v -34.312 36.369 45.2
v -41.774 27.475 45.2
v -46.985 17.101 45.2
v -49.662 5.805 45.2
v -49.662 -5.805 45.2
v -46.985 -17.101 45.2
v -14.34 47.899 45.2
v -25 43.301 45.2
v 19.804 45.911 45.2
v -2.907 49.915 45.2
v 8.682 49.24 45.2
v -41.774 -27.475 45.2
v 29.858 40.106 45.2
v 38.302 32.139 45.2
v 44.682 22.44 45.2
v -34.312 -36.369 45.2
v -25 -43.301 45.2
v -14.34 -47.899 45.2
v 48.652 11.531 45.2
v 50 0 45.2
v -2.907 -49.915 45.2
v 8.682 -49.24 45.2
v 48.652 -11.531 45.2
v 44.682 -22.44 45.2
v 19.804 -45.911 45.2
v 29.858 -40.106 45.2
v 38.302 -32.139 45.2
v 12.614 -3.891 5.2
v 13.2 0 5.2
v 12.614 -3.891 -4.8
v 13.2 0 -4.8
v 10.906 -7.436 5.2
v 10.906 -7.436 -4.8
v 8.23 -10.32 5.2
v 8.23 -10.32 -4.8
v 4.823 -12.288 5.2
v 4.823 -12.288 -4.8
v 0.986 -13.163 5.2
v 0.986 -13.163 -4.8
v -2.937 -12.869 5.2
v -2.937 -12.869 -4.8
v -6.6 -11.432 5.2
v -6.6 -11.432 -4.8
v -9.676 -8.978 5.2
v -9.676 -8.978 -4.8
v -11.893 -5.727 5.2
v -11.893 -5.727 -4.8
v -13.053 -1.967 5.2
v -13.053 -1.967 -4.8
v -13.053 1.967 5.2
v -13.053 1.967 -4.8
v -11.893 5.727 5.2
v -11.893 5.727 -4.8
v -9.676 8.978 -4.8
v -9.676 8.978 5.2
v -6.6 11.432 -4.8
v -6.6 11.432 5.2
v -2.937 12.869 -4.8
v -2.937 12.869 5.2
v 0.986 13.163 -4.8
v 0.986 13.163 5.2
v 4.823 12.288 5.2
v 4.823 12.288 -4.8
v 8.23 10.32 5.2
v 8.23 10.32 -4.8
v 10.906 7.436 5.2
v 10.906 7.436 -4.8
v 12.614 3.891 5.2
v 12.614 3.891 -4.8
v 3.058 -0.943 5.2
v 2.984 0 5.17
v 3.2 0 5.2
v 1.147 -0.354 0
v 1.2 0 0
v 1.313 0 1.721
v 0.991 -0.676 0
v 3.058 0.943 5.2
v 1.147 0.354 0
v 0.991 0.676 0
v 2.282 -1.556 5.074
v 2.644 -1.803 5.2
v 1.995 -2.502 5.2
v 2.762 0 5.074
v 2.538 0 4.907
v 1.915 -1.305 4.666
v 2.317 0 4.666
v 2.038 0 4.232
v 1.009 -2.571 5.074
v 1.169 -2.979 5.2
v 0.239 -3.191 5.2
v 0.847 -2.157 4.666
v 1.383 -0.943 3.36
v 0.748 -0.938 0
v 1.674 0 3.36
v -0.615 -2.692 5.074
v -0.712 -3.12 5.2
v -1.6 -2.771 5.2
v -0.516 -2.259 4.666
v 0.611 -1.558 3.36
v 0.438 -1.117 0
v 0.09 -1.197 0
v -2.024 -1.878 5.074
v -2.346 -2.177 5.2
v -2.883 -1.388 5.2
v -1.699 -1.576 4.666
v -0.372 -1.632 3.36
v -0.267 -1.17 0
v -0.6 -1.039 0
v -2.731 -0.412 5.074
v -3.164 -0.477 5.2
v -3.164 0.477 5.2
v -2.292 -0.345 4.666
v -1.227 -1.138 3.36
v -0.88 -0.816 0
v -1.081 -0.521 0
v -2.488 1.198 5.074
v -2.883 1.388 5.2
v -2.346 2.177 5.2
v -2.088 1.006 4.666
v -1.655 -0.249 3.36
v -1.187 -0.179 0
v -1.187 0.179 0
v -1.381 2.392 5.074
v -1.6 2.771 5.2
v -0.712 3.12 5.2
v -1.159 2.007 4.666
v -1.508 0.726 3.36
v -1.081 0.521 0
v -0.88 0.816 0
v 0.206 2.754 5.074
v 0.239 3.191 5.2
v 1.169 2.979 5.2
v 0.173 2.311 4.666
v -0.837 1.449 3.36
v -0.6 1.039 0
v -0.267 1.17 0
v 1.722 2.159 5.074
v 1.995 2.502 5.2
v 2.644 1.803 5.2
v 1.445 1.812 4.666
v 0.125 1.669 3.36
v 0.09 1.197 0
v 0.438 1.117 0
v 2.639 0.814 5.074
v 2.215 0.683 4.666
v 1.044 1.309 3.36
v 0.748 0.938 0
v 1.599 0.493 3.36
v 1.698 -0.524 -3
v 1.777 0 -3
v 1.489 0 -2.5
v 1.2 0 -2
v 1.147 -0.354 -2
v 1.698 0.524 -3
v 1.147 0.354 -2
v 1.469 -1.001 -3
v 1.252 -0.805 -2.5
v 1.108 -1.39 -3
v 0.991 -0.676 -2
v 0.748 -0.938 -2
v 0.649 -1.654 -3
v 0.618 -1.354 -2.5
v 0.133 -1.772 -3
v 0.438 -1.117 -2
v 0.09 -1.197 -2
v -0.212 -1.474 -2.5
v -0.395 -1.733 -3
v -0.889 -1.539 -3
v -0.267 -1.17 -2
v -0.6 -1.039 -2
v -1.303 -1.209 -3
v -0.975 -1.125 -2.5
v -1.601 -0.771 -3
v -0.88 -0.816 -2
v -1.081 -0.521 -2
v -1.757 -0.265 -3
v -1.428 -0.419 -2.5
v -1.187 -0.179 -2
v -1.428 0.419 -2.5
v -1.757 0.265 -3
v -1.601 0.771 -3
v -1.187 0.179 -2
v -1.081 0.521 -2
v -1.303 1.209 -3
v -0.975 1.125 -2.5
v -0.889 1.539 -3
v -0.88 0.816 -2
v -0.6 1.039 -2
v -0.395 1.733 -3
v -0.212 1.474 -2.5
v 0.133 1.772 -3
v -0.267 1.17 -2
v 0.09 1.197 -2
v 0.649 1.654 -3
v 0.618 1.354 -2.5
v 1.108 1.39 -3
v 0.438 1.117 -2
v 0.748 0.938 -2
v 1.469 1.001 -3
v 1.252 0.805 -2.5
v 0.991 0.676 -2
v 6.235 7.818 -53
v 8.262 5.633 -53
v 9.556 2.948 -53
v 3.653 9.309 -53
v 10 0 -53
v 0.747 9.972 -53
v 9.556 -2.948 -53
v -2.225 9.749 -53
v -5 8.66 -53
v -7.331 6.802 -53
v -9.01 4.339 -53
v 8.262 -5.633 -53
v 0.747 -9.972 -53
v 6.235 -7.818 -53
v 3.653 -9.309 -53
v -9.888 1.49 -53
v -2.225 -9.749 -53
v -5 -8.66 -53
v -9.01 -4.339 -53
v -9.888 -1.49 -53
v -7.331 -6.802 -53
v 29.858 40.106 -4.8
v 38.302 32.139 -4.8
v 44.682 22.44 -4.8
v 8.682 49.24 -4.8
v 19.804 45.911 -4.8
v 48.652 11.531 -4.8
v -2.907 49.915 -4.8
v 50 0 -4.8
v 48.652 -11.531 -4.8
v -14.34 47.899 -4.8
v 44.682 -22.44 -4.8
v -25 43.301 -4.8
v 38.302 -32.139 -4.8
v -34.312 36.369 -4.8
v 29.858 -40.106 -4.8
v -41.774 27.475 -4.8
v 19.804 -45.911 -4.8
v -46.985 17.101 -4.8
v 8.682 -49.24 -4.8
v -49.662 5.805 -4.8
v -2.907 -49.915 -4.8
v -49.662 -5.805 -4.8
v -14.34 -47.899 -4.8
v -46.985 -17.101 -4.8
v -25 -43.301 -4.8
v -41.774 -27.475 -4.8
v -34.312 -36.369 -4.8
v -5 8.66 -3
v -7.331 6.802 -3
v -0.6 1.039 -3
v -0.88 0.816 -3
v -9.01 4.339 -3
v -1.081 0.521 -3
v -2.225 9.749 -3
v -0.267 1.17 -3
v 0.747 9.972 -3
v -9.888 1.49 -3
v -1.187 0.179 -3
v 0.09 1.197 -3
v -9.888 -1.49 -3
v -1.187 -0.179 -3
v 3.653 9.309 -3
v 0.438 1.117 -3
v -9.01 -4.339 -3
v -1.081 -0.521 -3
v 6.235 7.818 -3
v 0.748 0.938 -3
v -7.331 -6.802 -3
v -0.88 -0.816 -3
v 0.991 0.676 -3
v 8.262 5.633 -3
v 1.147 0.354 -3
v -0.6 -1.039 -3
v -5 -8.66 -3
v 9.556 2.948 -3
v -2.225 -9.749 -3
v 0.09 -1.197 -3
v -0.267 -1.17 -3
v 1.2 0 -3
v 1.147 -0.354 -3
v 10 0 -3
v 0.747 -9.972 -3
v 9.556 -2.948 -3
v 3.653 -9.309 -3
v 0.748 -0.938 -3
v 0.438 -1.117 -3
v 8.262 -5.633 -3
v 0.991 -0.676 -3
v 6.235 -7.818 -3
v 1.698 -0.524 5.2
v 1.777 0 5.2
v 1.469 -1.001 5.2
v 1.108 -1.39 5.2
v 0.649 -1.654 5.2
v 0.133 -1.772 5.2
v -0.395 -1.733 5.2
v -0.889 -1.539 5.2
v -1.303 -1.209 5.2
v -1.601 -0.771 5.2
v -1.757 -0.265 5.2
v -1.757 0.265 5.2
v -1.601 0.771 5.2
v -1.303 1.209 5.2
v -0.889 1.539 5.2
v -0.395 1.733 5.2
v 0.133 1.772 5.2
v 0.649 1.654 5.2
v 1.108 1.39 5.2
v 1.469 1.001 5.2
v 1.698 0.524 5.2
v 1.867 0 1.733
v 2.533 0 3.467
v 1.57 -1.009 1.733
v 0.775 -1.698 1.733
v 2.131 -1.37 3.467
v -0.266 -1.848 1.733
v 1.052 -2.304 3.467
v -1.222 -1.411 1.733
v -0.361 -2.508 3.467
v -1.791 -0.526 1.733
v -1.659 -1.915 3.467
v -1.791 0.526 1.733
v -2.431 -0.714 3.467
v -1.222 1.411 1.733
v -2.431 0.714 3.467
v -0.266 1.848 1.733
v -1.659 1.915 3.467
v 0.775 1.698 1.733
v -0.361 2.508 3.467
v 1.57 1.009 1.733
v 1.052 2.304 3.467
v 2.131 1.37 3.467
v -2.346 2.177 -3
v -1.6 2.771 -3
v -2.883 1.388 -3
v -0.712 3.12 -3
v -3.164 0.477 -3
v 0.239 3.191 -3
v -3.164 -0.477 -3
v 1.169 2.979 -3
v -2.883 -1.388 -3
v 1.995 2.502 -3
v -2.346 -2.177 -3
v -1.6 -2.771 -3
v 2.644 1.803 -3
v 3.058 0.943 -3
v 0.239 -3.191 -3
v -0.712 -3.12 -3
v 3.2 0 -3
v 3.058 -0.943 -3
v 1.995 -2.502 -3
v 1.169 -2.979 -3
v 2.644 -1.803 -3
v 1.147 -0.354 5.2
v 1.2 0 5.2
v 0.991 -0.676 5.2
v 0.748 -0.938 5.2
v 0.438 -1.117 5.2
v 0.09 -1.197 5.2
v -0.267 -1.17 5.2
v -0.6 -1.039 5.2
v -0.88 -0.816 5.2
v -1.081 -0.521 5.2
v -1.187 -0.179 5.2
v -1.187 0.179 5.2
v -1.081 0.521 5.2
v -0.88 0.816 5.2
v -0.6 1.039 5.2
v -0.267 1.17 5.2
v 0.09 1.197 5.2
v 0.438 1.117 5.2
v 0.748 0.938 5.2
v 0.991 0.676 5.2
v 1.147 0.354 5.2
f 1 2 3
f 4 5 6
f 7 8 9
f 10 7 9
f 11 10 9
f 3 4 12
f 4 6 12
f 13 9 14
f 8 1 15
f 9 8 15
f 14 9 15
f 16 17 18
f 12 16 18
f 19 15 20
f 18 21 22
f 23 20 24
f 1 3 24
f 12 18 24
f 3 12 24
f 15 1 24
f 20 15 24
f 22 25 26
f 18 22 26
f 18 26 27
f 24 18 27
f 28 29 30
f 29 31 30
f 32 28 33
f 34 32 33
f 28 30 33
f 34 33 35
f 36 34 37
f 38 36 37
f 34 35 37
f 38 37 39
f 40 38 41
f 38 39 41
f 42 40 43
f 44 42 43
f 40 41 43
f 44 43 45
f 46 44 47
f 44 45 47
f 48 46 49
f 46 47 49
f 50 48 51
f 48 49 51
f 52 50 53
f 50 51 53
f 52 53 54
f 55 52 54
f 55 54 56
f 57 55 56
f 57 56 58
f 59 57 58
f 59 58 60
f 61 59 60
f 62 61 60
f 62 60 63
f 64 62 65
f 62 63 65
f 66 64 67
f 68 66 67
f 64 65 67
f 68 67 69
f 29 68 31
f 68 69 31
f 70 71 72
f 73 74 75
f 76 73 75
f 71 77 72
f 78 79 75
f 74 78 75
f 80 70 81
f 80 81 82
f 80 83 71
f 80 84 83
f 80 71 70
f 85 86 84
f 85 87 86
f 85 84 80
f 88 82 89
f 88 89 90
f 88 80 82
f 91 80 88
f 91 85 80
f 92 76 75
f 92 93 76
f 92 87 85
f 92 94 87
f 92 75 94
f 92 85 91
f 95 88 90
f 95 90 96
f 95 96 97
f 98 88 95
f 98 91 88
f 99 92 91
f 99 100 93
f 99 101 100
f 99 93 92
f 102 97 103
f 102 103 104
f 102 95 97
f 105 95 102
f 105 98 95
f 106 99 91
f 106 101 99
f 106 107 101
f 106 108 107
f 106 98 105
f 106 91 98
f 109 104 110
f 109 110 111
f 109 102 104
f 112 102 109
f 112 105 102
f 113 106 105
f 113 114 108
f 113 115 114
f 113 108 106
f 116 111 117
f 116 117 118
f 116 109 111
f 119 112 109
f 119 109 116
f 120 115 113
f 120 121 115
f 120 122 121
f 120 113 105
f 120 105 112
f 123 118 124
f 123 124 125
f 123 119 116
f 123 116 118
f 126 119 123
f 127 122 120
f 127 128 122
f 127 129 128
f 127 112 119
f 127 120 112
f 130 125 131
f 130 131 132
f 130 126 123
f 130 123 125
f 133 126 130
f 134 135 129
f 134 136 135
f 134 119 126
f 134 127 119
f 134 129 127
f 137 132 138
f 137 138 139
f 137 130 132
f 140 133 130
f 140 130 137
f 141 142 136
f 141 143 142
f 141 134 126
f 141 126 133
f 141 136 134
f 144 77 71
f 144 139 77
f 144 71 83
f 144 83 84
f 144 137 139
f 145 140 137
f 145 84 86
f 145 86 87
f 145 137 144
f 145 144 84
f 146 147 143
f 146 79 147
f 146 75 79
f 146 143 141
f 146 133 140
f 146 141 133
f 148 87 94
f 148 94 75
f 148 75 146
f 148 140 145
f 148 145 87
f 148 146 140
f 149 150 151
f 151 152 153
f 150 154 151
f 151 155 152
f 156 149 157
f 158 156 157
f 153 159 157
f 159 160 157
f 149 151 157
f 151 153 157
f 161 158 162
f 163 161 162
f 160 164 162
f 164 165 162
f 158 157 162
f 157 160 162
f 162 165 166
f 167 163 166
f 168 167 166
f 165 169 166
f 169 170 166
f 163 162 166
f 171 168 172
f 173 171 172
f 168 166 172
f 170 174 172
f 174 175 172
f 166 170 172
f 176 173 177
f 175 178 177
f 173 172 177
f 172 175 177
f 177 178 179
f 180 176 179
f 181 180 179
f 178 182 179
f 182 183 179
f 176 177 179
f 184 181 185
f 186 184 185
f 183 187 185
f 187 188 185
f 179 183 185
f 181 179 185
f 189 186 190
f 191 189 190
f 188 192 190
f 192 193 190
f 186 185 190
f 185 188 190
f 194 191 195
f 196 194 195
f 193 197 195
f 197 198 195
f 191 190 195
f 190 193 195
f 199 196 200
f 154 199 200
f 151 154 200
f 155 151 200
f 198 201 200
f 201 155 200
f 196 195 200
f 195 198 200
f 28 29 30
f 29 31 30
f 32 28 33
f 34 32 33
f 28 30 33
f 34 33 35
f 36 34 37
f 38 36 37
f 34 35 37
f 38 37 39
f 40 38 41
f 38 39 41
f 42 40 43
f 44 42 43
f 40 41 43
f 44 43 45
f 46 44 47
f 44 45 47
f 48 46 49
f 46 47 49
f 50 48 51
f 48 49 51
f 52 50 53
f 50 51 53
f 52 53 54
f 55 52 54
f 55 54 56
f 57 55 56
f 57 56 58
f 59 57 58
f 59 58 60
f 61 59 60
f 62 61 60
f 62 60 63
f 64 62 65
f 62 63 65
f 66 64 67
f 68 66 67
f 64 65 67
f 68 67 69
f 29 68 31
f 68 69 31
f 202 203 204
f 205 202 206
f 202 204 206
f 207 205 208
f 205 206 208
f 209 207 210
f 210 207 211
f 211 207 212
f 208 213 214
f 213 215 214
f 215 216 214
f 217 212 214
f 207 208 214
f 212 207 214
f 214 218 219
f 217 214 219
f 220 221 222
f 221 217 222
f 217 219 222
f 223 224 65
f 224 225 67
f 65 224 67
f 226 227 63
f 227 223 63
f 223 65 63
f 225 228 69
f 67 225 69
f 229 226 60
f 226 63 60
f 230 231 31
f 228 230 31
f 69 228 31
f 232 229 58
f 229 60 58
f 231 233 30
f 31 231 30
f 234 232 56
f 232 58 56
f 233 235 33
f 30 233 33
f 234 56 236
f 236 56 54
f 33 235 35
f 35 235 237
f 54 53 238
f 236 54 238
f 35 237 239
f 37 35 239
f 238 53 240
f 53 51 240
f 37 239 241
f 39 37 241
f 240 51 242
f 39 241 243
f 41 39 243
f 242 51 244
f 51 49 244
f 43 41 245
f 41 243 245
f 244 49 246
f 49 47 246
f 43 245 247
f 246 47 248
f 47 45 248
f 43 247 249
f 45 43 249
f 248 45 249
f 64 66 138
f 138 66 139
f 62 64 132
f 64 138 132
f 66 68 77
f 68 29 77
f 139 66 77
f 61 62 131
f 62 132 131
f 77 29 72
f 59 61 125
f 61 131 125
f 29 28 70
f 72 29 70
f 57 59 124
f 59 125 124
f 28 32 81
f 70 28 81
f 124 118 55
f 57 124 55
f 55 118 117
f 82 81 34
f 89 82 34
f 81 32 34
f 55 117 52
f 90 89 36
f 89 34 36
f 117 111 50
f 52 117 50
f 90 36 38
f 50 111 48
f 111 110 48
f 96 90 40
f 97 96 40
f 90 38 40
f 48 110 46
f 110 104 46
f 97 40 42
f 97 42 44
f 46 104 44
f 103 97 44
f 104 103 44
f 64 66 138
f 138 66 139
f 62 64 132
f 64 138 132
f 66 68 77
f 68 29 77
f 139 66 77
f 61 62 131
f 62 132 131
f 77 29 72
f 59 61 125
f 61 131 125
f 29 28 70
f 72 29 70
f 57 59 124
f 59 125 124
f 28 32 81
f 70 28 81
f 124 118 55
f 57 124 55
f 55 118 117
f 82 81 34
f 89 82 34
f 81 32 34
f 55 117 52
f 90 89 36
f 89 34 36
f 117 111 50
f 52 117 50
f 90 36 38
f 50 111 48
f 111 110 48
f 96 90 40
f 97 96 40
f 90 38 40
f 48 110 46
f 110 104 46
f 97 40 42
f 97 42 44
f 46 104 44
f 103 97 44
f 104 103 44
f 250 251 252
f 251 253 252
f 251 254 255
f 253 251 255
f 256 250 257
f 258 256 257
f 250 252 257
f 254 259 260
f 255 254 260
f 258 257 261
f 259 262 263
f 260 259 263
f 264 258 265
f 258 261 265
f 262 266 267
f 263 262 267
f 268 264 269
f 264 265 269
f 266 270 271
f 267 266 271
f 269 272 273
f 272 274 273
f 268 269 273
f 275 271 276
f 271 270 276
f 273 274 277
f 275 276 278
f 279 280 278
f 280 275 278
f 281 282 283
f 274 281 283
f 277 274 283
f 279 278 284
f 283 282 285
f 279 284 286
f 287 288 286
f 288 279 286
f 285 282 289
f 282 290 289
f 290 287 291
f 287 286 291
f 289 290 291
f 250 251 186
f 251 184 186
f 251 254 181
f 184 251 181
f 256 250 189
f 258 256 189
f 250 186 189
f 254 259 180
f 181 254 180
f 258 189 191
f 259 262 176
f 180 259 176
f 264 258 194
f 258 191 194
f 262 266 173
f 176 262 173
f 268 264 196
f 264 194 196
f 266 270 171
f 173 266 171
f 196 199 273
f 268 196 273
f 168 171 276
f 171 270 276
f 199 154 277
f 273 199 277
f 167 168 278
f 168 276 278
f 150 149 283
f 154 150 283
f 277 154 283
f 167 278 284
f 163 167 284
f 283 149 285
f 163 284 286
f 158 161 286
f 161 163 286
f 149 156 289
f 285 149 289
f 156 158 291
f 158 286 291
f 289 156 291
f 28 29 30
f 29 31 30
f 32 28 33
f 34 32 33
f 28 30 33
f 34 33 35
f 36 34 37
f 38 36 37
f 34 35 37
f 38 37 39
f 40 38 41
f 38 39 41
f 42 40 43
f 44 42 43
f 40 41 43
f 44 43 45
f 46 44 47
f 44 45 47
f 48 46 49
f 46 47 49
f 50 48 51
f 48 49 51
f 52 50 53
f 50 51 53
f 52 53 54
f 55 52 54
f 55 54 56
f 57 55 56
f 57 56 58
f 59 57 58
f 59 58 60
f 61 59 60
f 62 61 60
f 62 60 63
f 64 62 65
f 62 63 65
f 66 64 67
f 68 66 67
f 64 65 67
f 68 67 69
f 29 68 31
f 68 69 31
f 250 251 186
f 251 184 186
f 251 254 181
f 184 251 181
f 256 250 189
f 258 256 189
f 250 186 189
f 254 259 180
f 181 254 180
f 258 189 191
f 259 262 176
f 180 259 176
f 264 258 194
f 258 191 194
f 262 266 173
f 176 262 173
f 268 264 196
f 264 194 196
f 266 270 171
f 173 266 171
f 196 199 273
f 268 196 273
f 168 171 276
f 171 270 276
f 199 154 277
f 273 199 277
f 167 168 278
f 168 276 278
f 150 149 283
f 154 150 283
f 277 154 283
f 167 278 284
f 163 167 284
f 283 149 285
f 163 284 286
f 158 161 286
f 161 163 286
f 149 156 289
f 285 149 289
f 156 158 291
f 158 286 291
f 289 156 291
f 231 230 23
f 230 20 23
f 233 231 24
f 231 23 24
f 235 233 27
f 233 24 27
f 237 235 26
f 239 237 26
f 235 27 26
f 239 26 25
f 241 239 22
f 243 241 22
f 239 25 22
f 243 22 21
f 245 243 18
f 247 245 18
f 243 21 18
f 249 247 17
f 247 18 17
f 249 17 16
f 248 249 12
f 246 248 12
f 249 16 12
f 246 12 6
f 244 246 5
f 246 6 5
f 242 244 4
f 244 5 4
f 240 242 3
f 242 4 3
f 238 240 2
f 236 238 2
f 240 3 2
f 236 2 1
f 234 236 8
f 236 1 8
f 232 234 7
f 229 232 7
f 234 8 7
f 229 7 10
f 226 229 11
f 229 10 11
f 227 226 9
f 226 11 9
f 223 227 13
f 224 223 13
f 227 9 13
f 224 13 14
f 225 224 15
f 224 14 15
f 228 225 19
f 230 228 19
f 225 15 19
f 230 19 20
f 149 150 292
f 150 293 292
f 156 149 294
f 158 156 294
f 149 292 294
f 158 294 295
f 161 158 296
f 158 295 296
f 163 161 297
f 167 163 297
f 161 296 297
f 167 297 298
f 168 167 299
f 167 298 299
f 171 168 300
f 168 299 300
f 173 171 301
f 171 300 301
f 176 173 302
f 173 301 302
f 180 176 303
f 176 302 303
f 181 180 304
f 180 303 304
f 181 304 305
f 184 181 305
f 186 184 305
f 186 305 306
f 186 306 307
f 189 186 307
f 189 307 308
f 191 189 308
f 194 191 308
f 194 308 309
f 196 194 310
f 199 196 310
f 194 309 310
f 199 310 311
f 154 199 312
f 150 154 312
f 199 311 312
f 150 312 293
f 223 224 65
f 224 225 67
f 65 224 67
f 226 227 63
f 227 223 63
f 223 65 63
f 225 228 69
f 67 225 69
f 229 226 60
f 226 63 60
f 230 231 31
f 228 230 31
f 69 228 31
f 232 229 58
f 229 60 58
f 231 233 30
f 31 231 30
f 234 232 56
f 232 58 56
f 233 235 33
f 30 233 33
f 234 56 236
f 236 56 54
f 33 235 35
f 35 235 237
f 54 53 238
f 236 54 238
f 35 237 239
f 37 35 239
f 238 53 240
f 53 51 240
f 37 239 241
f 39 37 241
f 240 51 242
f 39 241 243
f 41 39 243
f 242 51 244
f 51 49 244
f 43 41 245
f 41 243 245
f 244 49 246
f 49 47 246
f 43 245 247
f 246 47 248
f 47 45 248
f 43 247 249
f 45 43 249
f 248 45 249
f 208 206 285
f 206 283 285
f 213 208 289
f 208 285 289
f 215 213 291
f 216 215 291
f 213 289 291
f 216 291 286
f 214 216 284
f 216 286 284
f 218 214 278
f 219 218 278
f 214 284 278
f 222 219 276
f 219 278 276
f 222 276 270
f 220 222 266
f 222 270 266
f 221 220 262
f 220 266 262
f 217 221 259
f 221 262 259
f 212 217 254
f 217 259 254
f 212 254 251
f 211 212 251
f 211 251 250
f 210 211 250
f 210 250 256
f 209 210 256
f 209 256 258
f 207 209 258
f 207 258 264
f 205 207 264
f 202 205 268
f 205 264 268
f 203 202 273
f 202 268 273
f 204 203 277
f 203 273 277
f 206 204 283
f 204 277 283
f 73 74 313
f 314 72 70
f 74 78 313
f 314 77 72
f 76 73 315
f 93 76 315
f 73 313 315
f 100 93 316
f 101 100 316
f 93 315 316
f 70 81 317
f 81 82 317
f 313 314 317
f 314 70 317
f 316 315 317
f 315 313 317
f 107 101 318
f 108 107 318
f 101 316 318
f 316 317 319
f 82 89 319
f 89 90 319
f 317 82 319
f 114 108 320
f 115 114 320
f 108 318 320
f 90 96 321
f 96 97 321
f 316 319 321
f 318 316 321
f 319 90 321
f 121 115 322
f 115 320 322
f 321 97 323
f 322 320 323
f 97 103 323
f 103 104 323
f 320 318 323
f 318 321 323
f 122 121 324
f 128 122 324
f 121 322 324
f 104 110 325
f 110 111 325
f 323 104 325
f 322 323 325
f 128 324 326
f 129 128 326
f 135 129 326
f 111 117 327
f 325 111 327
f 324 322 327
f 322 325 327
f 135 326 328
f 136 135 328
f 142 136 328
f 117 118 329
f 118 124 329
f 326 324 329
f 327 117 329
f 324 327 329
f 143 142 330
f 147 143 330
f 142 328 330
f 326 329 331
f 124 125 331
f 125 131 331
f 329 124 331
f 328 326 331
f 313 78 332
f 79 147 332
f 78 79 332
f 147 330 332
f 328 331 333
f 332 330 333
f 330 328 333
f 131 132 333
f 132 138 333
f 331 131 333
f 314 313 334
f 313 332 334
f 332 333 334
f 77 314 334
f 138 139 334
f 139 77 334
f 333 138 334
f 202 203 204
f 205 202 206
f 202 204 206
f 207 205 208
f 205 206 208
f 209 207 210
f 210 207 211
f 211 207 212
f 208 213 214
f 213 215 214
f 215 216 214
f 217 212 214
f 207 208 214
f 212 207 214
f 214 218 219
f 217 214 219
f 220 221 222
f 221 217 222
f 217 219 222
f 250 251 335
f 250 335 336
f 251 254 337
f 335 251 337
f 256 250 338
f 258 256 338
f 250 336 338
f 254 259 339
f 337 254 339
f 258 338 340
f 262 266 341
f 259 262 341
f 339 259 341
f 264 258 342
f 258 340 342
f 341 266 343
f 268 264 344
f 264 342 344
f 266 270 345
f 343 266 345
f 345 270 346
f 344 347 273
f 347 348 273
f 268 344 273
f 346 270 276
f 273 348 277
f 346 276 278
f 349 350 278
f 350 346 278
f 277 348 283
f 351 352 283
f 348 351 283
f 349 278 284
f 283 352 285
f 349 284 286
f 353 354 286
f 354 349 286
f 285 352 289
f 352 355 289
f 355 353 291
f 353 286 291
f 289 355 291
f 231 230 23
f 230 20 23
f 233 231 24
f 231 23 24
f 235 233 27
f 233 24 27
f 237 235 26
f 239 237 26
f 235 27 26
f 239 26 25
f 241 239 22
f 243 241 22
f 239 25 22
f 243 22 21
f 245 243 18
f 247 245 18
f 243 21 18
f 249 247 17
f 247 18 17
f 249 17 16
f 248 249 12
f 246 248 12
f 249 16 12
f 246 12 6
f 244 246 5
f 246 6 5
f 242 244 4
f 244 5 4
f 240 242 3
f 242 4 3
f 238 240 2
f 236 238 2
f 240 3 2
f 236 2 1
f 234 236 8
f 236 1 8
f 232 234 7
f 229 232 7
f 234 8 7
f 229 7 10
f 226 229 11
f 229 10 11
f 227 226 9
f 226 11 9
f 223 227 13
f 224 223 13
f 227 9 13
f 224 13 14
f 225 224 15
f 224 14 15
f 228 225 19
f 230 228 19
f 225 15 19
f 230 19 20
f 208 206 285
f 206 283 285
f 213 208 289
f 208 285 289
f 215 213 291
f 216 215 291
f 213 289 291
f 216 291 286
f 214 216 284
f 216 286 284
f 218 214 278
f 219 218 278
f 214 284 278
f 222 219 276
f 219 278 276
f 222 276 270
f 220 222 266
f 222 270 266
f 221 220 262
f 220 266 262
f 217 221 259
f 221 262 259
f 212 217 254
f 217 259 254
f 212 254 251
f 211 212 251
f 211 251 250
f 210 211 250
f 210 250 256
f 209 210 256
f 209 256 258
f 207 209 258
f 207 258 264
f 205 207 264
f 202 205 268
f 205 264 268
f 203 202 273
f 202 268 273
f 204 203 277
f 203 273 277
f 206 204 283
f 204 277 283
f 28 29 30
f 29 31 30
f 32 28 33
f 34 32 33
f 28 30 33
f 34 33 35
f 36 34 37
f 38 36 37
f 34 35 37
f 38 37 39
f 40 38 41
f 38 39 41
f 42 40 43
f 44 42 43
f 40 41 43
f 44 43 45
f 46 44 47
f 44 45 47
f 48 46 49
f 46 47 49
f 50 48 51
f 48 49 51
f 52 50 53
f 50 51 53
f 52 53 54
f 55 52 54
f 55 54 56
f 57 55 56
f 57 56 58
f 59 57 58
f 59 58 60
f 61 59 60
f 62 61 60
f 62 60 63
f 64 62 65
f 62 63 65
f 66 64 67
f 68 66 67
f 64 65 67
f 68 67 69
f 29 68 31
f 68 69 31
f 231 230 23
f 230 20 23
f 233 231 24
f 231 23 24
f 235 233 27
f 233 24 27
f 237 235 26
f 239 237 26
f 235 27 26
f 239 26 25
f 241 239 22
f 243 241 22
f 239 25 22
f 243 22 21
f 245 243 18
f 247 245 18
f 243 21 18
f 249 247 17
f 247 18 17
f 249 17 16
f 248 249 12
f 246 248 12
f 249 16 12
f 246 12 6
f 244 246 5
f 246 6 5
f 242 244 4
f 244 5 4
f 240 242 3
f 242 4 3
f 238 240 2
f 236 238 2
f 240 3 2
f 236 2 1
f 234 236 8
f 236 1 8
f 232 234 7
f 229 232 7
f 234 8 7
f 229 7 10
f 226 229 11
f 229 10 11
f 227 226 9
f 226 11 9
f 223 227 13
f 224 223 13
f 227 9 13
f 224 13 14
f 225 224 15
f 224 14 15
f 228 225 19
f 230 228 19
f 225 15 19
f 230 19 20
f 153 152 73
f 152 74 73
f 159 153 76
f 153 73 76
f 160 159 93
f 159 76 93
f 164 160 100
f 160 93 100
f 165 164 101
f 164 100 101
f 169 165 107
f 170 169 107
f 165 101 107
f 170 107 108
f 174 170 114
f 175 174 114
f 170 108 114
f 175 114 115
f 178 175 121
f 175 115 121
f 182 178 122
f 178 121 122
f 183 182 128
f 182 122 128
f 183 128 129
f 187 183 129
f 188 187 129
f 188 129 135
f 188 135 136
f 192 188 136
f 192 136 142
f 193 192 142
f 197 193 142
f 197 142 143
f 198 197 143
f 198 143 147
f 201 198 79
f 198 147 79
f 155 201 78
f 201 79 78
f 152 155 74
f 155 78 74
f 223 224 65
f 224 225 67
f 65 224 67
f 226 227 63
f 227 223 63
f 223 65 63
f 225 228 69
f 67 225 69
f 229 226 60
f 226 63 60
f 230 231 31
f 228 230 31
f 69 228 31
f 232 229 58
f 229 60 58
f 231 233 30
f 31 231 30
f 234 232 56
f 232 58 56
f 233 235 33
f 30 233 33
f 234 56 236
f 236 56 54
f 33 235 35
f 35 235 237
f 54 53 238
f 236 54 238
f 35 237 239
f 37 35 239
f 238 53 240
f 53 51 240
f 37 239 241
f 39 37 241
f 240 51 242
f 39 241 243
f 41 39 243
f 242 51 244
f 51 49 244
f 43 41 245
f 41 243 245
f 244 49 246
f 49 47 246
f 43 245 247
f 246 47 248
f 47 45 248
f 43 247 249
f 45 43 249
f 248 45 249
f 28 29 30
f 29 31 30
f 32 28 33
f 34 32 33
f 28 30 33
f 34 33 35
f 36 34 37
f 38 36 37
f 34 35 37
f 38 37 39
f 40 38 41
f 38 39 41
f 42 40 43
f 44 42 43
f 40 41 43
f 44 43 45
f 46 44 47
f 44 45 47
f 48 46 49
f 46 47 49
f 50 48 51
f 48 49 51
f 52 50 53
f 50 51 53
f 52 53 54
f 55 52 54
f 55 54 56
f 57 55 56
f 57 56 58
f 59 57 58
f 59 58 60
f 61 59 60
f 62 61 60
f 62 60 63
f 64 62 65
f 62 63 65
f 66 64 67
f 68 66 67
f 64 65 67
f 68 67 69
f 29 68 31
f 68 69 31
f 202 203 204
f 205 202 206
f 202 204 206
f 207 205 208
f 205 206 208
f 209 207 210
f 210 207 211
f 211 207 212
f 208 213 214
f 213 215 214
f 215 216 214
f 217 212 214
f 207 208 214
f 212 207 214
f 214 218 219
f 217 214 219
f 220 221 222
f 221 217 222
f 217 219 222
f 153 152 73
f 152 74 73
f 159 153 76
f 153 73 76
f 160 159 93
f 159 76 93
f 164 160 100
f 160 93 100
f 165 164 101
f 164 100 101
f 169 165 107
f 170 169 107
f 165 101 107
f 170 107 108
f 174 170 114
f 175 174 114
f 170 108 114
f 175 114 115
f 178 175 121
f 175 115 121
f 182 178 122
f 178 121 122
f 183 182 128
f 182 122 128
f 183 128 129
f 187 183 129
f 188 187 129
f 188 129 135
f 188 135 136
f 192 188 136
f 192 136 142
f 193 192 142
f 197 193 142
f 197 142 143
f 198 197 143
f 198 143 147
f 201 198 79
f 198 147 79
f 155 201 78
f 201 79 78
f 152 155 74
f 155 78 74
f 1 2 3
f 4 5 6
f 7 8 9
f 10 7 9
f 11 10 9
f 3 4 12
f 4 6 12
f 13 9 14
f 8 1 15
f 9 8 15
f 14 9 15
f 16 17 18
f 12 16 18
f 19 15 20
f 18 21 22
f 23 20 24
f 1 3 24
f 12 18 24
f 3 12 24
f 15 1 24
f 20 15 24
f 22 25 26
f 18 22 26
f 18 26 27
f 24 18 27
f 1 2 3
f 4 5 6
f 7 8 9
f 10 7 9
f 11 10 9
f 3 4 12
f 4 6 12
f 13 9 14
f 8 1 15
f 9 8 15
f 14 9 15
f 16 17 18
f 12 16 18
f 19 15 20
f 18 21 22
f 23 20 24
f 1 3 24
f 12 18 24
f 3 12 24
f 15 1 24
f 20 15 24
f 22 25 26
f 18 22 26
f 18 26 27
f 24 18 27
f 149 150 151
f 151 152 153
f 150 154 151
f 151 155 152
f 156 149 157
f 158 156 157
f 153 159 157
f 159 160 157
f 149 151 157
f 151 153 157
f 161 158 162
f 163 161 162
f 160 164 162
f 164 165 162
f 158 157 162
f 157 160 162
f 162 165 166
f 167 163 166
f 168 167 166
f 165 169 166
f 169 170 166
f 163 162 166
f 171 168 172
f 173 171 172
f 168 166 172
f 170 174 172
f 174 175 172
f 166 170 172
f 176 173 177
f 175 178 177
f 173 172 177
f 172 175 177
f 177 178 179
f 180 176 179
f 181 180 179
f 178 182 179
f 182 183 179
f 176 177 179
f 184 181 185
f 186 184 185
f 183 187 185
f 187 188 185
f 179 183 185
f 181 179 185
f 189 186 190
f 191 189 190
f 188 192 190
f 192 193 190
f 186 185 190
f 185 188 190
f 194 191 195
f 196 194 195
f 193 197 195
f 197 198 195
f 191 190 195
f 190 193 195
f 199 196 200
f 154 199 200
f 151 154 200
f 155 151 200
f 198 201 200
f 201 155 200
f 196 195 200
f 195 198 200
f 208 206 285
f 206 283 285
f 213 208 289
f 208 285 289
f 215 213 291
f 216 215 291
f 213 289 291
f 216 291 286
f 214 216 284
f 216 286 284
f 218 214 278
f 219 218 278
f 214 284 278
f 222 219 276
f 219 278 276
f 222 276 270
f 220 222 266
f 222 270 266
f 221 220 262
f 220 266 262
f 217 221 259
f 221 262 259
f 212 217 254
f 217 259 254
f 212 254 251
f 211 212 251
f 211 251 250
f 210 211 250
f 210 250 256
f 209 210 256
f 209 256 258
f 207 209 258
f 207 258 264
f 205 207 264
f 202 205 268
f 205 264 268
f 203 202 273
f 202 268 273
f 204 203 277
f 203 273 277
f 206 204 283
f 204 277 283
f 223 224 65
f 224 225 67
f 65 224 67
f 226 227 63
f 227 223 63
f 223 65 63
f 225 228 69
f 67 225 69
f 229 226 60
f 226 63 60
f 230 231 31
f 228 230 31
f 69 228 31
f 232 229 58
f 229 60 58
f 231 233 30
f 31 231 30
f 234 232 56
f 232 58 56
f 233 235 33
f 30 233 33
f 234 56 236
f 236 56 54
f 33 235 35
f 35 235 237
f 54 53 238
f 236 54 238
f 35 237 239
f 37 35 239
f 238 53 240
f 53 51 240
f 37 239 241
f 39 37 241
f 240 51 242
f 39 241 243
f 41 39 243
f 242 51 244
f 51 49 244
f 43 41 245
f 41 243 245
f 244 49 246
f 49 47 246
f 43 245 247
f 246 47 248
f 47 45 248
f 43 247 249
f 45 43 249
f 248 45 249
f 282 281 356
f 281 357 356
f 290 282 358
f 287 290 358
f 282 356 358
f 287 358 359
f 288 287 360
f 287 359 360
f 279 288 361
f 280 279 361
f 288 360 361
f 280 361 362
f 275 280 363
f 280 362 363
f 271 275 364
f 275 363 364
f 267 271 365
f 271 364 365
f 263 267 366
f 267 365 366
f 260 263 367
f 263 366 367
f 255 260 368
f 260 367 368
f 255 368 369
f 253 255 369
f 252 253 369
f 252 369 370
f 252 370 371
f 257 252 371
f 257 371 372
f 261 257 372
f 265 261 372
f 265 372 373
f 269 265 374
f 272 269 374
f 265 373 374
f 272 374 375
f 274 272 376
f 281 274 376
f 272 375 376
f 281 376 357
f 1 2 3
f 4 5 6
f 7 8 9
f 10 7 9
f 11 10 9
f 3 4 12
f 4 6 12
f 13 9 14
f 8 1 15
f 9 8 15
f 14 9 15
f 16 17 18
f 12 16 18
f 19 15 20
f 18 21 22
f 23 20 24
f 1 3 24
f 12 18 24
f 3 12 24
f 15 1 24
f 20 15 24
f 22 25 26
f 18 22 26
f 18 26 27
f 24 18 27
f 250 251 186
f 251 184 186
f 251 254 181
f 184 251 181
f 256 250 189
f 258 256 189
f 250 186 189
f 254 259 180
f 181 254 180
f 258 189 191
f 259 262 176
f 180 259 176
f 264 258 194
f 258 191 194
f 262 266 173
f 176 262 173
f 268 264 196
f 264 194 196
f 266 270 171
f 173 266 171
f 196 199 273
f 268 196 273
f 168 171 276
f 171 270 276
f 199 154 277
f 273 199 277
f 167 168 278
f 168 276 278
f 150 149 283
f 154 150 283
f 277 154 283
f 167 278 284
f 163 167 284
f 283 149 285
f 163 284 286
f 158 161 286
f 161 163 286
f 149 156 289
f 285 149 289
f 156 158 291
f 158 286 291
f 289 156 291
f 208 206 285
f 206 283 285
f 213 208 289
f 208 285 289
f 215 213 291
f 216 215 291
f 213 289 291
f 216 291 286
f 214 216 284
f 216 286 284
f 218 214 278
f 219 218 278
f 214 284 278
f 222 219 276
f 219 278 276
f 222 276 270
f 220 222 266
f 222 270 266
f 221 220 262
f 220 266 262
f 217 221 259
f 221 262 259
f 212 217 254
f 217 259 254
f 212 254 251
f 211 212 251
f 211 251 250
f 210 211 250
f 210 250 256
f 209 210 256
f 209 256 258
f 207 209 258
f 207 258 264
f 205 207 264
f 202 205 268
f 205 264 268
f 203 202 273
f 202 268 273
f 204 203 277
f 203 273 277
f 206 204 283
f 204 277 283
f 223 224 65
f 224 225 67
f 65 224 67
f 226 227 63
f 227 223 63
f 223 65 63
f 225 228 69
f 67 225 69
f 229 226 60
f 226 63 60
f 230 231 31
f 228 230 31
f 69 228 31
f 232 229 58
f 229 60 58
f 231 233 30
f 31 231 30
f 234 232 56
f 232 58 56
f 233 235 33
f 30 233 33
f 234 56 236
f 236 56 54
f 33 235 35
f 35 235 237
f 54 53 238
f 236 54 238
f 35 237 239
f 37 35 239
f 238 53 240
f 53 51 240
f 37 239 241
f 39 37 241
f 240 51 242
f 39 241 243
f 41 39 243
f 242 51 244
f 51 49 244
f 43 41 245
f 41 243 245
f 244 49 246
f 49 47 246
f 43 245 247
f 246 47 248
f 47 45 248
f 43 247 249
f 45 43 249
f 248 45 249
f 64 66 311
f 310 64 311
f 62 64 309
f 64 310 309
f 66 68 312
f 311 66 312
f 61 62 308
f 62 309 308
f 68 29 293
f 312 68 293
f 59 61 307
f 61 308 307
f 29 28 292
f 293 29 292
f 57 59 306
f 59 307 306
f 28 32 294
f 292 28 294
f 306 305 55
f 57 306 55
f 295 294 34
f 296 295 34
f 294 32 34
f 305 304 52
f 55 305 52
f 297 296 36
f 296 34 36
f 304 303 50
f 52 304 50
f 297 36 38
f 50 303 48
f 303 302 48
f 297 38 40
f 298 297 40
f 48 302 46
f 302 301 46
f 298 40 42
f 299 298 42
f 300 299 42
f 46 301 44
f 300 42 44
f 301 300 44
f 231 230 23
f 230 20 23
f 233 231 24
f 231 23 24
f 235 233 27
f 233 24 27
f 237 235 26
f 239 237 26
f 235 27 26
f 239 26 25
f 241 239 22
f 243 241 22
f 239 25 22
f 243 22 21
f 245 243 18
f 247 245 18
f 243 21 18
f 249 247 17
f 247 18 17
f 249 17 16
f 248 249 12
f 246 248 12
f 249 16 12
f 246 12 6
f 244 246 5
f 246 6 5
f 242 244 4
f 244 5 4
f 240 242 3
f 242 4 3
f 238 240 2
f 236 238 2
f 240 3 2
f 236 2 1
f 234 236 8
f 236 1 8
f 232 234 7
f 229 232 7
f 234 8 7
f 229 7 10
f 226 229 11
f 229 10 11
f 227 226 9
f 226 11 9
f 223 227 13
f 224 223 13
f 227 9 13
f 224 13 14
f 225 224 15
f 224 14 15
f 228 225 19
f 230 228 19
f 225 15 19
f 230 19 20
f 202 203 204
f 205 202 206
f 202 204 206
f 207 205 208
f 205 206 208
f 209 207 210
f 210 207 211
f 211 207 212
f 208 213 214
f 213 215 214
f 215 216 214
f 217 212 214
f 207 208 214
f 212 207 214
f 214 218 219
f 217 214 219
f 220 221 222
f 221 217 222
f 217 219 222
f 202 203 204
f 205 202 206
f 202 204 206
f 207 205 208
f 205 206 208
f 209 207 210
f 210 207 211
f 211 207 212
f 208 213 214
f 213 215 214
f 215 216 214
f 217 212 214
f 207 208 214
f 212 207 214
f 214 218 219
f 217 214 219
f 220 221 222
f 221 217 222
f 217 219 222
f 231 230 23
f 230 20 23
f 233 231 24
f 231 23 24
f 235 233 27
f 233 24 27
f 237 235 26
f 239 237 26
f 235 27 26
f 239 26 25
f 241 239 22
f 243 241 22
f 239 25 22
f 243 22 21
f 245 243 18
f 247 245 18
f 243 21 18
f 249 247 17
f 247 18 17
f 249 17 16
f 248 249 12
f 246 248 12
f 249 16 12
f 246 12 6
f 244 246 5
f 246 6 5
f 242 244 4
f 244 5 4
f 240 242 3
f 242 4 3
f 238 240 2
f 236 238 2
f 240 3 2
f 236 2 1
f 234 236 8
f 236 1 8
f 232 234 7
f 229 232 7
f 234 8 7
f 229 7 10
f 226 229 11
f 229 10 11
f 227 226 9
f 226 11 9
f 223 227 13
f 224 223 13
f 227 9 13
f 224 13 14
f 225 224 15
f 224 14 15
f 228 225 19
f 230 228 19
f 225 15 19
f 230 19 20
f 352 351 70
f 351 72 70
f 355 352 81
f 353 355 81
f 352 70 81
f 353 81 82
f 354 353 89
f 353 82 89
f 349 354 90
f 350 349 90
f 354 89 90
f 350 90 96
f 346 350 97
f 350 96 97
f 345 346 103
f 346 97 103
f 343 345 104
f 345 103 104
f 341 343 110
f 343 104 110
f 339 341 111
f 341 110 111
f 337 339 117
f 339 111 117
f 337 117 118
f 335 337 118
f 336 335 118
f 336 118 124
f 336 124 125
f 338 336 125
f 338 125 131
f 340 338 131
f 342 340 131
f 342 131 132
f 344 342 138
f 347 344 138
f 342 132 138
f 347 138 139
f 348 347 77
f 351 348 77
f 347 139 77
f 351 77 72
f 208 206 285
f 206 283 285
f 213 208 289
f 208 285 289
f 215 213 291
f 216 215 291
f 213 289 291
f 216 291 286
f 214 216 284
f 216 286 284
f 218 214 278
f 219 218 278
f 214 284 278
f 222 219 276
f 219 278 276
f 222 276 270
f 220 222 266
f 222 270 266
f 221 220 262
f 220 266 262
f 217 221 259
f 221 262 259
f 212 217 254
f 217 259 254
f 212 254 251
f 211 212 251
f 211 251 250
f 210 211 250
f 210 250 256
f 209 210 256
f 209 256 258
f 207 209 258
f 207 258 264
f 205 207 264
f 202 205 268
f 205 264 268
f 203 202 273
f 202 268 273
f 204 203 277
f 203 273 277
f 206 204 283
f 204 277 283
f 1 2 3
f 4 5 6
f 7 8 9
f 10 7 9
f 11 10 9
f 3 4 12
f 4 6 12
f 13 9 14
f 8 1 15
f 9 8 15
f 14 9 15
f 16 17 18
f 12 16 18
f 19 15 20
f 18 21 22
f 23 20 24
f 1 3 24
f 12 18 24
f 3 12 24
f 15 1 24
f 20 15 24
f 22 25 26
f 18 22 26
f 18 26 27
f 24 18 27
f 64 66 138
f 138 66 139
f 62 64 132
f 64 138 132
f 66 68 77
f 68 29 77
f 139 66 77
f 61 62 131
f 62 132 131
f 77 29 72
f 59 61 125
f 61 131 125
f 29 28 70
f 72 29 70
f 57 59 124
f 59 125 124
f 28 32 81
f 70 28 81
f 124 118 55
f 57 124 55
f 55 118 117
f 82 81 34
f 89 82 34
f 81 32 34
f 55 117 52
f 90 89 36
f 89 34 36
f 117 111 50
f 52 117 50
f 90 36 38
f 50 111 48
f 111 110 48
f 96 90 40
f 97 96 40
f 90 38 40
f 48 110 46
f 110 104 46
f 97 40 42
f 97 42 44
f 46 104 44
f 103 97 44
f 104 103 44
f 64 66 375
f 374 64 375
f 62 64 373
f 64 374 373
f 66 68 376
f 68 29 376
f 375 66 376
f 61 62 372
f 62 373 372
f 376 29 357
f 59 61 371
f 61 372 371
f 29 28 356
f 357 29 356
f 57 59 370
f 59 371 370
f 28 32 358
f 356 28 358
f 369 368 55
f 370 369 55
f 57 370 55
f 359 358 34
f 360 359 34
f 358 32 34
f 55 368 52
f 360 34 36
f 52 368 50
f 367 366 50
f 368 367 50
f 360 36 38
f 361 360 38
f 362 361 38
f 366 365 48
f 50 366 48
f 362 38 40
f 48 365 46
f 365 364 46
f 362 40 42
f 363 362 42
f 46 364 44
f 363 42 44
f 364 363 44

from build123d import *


with BuildPart() as f1:
    # F0 (on Front) → F1 (revolve)
    with BuildSketch(Plane.XZ):
        with BuildLine():
            add(Edge.make_bspline(
                [(3.2, 5.2), (1.2, 5.2), (1.2, 0)],
                knots=[0, 0, 0, 1.5707963268, 1.5707963268, 1.5707963268], degree=2, weights=[1, 0.7071067812, 1]))
            Line((3.2, 5.2), (13.2, 5.2))
            Line((13.2, 5.2), (13.2, -4.8))
            Line((13.2, -4.8), (50, -4.8))
            Line((50, -4.8), (50, 45.2))
            Line((50, 45.2), (0, 45.2))
            Line((0, 45.2), (0, -53))
            Line((0, -53), (10, -53))
            Line((10, -53), (10, -3))
            Line((10, -3), (1.7773502692, -3))
            Line((1.7773502692, -3), (1.2, -2))
            Line((1.2, -2), (1.2, 0))
        make_face()
    revolve(axis=Axis((0, 0, -3.9), (0, 0, -1)))


with BuildPart() as f3:
    # F2 (on Front) → F3 (revolve)
    with BuildSketch(Plane.XZ):
        Polygon((1.2, 5.2), (3.2, 5.2), (13.2, 5.2), (13.2, -4.8), (50, -4.8), (50, 45.2), (0, 45.2), (0, -53), (10, -53), (10, -3), (1.7773502692, -3), (1.2, -3), (1.2, -2), (1.2, 0), align=None)
    revolve(axis=Axis((0, 0, -3.9), (0, 0, -1)))


with BuildPart() as f5:
    # F4 (on Front) → F5 (revolve)
    with BuildSketch(Plane.XZ):
        Polygon((13.2, 5.2), (13.2, -4.8), (50, -4.8), (50, 45.2), (0, 45.2), (0, -53), (10, -53), (10, -3), (1.7773502692, -3), (1.7773502692, 5.2), align=None)
    revolve(axis=Axis((0, 0, -3.9), (0, 0, -1)))


with BuildPart() as f7:
    # F6 (on Front) → F7 (revolve)
    with BuildSketch(Plane.XZ):
        Polygon((3.2, 5.2), (13.2, 5.2), (13.2, -4.8), (50, -4.8), (50, 45.2), (0, 45.2), (0, -53), (10, -53), (10, -3), (3.2, -3), align=None)
    revolve(axis=Axis((0, 0, -3.9), (0, 0, -1)))


with BuildPart() as f9:
    # F8 (on face) → F9 (revolve)
    with BuildSketch(Plane.XZ):
        Polygon((1.2, 0), (3.2, 5.2), (13.2, 5.2), (13.2, -4.8), (50, -4.8), (50, 45.2), (0, 45.2), (0, -53), (10, -53), (10, -3), (1.7773502692, -3), (1.2, -2), align=None)
    revolve(axis=Axis((0, 0, -3.9), (0, 0, -1)))


solid = Compound([f1.part, f3.part, f5.part, f7.part, f9.part])
